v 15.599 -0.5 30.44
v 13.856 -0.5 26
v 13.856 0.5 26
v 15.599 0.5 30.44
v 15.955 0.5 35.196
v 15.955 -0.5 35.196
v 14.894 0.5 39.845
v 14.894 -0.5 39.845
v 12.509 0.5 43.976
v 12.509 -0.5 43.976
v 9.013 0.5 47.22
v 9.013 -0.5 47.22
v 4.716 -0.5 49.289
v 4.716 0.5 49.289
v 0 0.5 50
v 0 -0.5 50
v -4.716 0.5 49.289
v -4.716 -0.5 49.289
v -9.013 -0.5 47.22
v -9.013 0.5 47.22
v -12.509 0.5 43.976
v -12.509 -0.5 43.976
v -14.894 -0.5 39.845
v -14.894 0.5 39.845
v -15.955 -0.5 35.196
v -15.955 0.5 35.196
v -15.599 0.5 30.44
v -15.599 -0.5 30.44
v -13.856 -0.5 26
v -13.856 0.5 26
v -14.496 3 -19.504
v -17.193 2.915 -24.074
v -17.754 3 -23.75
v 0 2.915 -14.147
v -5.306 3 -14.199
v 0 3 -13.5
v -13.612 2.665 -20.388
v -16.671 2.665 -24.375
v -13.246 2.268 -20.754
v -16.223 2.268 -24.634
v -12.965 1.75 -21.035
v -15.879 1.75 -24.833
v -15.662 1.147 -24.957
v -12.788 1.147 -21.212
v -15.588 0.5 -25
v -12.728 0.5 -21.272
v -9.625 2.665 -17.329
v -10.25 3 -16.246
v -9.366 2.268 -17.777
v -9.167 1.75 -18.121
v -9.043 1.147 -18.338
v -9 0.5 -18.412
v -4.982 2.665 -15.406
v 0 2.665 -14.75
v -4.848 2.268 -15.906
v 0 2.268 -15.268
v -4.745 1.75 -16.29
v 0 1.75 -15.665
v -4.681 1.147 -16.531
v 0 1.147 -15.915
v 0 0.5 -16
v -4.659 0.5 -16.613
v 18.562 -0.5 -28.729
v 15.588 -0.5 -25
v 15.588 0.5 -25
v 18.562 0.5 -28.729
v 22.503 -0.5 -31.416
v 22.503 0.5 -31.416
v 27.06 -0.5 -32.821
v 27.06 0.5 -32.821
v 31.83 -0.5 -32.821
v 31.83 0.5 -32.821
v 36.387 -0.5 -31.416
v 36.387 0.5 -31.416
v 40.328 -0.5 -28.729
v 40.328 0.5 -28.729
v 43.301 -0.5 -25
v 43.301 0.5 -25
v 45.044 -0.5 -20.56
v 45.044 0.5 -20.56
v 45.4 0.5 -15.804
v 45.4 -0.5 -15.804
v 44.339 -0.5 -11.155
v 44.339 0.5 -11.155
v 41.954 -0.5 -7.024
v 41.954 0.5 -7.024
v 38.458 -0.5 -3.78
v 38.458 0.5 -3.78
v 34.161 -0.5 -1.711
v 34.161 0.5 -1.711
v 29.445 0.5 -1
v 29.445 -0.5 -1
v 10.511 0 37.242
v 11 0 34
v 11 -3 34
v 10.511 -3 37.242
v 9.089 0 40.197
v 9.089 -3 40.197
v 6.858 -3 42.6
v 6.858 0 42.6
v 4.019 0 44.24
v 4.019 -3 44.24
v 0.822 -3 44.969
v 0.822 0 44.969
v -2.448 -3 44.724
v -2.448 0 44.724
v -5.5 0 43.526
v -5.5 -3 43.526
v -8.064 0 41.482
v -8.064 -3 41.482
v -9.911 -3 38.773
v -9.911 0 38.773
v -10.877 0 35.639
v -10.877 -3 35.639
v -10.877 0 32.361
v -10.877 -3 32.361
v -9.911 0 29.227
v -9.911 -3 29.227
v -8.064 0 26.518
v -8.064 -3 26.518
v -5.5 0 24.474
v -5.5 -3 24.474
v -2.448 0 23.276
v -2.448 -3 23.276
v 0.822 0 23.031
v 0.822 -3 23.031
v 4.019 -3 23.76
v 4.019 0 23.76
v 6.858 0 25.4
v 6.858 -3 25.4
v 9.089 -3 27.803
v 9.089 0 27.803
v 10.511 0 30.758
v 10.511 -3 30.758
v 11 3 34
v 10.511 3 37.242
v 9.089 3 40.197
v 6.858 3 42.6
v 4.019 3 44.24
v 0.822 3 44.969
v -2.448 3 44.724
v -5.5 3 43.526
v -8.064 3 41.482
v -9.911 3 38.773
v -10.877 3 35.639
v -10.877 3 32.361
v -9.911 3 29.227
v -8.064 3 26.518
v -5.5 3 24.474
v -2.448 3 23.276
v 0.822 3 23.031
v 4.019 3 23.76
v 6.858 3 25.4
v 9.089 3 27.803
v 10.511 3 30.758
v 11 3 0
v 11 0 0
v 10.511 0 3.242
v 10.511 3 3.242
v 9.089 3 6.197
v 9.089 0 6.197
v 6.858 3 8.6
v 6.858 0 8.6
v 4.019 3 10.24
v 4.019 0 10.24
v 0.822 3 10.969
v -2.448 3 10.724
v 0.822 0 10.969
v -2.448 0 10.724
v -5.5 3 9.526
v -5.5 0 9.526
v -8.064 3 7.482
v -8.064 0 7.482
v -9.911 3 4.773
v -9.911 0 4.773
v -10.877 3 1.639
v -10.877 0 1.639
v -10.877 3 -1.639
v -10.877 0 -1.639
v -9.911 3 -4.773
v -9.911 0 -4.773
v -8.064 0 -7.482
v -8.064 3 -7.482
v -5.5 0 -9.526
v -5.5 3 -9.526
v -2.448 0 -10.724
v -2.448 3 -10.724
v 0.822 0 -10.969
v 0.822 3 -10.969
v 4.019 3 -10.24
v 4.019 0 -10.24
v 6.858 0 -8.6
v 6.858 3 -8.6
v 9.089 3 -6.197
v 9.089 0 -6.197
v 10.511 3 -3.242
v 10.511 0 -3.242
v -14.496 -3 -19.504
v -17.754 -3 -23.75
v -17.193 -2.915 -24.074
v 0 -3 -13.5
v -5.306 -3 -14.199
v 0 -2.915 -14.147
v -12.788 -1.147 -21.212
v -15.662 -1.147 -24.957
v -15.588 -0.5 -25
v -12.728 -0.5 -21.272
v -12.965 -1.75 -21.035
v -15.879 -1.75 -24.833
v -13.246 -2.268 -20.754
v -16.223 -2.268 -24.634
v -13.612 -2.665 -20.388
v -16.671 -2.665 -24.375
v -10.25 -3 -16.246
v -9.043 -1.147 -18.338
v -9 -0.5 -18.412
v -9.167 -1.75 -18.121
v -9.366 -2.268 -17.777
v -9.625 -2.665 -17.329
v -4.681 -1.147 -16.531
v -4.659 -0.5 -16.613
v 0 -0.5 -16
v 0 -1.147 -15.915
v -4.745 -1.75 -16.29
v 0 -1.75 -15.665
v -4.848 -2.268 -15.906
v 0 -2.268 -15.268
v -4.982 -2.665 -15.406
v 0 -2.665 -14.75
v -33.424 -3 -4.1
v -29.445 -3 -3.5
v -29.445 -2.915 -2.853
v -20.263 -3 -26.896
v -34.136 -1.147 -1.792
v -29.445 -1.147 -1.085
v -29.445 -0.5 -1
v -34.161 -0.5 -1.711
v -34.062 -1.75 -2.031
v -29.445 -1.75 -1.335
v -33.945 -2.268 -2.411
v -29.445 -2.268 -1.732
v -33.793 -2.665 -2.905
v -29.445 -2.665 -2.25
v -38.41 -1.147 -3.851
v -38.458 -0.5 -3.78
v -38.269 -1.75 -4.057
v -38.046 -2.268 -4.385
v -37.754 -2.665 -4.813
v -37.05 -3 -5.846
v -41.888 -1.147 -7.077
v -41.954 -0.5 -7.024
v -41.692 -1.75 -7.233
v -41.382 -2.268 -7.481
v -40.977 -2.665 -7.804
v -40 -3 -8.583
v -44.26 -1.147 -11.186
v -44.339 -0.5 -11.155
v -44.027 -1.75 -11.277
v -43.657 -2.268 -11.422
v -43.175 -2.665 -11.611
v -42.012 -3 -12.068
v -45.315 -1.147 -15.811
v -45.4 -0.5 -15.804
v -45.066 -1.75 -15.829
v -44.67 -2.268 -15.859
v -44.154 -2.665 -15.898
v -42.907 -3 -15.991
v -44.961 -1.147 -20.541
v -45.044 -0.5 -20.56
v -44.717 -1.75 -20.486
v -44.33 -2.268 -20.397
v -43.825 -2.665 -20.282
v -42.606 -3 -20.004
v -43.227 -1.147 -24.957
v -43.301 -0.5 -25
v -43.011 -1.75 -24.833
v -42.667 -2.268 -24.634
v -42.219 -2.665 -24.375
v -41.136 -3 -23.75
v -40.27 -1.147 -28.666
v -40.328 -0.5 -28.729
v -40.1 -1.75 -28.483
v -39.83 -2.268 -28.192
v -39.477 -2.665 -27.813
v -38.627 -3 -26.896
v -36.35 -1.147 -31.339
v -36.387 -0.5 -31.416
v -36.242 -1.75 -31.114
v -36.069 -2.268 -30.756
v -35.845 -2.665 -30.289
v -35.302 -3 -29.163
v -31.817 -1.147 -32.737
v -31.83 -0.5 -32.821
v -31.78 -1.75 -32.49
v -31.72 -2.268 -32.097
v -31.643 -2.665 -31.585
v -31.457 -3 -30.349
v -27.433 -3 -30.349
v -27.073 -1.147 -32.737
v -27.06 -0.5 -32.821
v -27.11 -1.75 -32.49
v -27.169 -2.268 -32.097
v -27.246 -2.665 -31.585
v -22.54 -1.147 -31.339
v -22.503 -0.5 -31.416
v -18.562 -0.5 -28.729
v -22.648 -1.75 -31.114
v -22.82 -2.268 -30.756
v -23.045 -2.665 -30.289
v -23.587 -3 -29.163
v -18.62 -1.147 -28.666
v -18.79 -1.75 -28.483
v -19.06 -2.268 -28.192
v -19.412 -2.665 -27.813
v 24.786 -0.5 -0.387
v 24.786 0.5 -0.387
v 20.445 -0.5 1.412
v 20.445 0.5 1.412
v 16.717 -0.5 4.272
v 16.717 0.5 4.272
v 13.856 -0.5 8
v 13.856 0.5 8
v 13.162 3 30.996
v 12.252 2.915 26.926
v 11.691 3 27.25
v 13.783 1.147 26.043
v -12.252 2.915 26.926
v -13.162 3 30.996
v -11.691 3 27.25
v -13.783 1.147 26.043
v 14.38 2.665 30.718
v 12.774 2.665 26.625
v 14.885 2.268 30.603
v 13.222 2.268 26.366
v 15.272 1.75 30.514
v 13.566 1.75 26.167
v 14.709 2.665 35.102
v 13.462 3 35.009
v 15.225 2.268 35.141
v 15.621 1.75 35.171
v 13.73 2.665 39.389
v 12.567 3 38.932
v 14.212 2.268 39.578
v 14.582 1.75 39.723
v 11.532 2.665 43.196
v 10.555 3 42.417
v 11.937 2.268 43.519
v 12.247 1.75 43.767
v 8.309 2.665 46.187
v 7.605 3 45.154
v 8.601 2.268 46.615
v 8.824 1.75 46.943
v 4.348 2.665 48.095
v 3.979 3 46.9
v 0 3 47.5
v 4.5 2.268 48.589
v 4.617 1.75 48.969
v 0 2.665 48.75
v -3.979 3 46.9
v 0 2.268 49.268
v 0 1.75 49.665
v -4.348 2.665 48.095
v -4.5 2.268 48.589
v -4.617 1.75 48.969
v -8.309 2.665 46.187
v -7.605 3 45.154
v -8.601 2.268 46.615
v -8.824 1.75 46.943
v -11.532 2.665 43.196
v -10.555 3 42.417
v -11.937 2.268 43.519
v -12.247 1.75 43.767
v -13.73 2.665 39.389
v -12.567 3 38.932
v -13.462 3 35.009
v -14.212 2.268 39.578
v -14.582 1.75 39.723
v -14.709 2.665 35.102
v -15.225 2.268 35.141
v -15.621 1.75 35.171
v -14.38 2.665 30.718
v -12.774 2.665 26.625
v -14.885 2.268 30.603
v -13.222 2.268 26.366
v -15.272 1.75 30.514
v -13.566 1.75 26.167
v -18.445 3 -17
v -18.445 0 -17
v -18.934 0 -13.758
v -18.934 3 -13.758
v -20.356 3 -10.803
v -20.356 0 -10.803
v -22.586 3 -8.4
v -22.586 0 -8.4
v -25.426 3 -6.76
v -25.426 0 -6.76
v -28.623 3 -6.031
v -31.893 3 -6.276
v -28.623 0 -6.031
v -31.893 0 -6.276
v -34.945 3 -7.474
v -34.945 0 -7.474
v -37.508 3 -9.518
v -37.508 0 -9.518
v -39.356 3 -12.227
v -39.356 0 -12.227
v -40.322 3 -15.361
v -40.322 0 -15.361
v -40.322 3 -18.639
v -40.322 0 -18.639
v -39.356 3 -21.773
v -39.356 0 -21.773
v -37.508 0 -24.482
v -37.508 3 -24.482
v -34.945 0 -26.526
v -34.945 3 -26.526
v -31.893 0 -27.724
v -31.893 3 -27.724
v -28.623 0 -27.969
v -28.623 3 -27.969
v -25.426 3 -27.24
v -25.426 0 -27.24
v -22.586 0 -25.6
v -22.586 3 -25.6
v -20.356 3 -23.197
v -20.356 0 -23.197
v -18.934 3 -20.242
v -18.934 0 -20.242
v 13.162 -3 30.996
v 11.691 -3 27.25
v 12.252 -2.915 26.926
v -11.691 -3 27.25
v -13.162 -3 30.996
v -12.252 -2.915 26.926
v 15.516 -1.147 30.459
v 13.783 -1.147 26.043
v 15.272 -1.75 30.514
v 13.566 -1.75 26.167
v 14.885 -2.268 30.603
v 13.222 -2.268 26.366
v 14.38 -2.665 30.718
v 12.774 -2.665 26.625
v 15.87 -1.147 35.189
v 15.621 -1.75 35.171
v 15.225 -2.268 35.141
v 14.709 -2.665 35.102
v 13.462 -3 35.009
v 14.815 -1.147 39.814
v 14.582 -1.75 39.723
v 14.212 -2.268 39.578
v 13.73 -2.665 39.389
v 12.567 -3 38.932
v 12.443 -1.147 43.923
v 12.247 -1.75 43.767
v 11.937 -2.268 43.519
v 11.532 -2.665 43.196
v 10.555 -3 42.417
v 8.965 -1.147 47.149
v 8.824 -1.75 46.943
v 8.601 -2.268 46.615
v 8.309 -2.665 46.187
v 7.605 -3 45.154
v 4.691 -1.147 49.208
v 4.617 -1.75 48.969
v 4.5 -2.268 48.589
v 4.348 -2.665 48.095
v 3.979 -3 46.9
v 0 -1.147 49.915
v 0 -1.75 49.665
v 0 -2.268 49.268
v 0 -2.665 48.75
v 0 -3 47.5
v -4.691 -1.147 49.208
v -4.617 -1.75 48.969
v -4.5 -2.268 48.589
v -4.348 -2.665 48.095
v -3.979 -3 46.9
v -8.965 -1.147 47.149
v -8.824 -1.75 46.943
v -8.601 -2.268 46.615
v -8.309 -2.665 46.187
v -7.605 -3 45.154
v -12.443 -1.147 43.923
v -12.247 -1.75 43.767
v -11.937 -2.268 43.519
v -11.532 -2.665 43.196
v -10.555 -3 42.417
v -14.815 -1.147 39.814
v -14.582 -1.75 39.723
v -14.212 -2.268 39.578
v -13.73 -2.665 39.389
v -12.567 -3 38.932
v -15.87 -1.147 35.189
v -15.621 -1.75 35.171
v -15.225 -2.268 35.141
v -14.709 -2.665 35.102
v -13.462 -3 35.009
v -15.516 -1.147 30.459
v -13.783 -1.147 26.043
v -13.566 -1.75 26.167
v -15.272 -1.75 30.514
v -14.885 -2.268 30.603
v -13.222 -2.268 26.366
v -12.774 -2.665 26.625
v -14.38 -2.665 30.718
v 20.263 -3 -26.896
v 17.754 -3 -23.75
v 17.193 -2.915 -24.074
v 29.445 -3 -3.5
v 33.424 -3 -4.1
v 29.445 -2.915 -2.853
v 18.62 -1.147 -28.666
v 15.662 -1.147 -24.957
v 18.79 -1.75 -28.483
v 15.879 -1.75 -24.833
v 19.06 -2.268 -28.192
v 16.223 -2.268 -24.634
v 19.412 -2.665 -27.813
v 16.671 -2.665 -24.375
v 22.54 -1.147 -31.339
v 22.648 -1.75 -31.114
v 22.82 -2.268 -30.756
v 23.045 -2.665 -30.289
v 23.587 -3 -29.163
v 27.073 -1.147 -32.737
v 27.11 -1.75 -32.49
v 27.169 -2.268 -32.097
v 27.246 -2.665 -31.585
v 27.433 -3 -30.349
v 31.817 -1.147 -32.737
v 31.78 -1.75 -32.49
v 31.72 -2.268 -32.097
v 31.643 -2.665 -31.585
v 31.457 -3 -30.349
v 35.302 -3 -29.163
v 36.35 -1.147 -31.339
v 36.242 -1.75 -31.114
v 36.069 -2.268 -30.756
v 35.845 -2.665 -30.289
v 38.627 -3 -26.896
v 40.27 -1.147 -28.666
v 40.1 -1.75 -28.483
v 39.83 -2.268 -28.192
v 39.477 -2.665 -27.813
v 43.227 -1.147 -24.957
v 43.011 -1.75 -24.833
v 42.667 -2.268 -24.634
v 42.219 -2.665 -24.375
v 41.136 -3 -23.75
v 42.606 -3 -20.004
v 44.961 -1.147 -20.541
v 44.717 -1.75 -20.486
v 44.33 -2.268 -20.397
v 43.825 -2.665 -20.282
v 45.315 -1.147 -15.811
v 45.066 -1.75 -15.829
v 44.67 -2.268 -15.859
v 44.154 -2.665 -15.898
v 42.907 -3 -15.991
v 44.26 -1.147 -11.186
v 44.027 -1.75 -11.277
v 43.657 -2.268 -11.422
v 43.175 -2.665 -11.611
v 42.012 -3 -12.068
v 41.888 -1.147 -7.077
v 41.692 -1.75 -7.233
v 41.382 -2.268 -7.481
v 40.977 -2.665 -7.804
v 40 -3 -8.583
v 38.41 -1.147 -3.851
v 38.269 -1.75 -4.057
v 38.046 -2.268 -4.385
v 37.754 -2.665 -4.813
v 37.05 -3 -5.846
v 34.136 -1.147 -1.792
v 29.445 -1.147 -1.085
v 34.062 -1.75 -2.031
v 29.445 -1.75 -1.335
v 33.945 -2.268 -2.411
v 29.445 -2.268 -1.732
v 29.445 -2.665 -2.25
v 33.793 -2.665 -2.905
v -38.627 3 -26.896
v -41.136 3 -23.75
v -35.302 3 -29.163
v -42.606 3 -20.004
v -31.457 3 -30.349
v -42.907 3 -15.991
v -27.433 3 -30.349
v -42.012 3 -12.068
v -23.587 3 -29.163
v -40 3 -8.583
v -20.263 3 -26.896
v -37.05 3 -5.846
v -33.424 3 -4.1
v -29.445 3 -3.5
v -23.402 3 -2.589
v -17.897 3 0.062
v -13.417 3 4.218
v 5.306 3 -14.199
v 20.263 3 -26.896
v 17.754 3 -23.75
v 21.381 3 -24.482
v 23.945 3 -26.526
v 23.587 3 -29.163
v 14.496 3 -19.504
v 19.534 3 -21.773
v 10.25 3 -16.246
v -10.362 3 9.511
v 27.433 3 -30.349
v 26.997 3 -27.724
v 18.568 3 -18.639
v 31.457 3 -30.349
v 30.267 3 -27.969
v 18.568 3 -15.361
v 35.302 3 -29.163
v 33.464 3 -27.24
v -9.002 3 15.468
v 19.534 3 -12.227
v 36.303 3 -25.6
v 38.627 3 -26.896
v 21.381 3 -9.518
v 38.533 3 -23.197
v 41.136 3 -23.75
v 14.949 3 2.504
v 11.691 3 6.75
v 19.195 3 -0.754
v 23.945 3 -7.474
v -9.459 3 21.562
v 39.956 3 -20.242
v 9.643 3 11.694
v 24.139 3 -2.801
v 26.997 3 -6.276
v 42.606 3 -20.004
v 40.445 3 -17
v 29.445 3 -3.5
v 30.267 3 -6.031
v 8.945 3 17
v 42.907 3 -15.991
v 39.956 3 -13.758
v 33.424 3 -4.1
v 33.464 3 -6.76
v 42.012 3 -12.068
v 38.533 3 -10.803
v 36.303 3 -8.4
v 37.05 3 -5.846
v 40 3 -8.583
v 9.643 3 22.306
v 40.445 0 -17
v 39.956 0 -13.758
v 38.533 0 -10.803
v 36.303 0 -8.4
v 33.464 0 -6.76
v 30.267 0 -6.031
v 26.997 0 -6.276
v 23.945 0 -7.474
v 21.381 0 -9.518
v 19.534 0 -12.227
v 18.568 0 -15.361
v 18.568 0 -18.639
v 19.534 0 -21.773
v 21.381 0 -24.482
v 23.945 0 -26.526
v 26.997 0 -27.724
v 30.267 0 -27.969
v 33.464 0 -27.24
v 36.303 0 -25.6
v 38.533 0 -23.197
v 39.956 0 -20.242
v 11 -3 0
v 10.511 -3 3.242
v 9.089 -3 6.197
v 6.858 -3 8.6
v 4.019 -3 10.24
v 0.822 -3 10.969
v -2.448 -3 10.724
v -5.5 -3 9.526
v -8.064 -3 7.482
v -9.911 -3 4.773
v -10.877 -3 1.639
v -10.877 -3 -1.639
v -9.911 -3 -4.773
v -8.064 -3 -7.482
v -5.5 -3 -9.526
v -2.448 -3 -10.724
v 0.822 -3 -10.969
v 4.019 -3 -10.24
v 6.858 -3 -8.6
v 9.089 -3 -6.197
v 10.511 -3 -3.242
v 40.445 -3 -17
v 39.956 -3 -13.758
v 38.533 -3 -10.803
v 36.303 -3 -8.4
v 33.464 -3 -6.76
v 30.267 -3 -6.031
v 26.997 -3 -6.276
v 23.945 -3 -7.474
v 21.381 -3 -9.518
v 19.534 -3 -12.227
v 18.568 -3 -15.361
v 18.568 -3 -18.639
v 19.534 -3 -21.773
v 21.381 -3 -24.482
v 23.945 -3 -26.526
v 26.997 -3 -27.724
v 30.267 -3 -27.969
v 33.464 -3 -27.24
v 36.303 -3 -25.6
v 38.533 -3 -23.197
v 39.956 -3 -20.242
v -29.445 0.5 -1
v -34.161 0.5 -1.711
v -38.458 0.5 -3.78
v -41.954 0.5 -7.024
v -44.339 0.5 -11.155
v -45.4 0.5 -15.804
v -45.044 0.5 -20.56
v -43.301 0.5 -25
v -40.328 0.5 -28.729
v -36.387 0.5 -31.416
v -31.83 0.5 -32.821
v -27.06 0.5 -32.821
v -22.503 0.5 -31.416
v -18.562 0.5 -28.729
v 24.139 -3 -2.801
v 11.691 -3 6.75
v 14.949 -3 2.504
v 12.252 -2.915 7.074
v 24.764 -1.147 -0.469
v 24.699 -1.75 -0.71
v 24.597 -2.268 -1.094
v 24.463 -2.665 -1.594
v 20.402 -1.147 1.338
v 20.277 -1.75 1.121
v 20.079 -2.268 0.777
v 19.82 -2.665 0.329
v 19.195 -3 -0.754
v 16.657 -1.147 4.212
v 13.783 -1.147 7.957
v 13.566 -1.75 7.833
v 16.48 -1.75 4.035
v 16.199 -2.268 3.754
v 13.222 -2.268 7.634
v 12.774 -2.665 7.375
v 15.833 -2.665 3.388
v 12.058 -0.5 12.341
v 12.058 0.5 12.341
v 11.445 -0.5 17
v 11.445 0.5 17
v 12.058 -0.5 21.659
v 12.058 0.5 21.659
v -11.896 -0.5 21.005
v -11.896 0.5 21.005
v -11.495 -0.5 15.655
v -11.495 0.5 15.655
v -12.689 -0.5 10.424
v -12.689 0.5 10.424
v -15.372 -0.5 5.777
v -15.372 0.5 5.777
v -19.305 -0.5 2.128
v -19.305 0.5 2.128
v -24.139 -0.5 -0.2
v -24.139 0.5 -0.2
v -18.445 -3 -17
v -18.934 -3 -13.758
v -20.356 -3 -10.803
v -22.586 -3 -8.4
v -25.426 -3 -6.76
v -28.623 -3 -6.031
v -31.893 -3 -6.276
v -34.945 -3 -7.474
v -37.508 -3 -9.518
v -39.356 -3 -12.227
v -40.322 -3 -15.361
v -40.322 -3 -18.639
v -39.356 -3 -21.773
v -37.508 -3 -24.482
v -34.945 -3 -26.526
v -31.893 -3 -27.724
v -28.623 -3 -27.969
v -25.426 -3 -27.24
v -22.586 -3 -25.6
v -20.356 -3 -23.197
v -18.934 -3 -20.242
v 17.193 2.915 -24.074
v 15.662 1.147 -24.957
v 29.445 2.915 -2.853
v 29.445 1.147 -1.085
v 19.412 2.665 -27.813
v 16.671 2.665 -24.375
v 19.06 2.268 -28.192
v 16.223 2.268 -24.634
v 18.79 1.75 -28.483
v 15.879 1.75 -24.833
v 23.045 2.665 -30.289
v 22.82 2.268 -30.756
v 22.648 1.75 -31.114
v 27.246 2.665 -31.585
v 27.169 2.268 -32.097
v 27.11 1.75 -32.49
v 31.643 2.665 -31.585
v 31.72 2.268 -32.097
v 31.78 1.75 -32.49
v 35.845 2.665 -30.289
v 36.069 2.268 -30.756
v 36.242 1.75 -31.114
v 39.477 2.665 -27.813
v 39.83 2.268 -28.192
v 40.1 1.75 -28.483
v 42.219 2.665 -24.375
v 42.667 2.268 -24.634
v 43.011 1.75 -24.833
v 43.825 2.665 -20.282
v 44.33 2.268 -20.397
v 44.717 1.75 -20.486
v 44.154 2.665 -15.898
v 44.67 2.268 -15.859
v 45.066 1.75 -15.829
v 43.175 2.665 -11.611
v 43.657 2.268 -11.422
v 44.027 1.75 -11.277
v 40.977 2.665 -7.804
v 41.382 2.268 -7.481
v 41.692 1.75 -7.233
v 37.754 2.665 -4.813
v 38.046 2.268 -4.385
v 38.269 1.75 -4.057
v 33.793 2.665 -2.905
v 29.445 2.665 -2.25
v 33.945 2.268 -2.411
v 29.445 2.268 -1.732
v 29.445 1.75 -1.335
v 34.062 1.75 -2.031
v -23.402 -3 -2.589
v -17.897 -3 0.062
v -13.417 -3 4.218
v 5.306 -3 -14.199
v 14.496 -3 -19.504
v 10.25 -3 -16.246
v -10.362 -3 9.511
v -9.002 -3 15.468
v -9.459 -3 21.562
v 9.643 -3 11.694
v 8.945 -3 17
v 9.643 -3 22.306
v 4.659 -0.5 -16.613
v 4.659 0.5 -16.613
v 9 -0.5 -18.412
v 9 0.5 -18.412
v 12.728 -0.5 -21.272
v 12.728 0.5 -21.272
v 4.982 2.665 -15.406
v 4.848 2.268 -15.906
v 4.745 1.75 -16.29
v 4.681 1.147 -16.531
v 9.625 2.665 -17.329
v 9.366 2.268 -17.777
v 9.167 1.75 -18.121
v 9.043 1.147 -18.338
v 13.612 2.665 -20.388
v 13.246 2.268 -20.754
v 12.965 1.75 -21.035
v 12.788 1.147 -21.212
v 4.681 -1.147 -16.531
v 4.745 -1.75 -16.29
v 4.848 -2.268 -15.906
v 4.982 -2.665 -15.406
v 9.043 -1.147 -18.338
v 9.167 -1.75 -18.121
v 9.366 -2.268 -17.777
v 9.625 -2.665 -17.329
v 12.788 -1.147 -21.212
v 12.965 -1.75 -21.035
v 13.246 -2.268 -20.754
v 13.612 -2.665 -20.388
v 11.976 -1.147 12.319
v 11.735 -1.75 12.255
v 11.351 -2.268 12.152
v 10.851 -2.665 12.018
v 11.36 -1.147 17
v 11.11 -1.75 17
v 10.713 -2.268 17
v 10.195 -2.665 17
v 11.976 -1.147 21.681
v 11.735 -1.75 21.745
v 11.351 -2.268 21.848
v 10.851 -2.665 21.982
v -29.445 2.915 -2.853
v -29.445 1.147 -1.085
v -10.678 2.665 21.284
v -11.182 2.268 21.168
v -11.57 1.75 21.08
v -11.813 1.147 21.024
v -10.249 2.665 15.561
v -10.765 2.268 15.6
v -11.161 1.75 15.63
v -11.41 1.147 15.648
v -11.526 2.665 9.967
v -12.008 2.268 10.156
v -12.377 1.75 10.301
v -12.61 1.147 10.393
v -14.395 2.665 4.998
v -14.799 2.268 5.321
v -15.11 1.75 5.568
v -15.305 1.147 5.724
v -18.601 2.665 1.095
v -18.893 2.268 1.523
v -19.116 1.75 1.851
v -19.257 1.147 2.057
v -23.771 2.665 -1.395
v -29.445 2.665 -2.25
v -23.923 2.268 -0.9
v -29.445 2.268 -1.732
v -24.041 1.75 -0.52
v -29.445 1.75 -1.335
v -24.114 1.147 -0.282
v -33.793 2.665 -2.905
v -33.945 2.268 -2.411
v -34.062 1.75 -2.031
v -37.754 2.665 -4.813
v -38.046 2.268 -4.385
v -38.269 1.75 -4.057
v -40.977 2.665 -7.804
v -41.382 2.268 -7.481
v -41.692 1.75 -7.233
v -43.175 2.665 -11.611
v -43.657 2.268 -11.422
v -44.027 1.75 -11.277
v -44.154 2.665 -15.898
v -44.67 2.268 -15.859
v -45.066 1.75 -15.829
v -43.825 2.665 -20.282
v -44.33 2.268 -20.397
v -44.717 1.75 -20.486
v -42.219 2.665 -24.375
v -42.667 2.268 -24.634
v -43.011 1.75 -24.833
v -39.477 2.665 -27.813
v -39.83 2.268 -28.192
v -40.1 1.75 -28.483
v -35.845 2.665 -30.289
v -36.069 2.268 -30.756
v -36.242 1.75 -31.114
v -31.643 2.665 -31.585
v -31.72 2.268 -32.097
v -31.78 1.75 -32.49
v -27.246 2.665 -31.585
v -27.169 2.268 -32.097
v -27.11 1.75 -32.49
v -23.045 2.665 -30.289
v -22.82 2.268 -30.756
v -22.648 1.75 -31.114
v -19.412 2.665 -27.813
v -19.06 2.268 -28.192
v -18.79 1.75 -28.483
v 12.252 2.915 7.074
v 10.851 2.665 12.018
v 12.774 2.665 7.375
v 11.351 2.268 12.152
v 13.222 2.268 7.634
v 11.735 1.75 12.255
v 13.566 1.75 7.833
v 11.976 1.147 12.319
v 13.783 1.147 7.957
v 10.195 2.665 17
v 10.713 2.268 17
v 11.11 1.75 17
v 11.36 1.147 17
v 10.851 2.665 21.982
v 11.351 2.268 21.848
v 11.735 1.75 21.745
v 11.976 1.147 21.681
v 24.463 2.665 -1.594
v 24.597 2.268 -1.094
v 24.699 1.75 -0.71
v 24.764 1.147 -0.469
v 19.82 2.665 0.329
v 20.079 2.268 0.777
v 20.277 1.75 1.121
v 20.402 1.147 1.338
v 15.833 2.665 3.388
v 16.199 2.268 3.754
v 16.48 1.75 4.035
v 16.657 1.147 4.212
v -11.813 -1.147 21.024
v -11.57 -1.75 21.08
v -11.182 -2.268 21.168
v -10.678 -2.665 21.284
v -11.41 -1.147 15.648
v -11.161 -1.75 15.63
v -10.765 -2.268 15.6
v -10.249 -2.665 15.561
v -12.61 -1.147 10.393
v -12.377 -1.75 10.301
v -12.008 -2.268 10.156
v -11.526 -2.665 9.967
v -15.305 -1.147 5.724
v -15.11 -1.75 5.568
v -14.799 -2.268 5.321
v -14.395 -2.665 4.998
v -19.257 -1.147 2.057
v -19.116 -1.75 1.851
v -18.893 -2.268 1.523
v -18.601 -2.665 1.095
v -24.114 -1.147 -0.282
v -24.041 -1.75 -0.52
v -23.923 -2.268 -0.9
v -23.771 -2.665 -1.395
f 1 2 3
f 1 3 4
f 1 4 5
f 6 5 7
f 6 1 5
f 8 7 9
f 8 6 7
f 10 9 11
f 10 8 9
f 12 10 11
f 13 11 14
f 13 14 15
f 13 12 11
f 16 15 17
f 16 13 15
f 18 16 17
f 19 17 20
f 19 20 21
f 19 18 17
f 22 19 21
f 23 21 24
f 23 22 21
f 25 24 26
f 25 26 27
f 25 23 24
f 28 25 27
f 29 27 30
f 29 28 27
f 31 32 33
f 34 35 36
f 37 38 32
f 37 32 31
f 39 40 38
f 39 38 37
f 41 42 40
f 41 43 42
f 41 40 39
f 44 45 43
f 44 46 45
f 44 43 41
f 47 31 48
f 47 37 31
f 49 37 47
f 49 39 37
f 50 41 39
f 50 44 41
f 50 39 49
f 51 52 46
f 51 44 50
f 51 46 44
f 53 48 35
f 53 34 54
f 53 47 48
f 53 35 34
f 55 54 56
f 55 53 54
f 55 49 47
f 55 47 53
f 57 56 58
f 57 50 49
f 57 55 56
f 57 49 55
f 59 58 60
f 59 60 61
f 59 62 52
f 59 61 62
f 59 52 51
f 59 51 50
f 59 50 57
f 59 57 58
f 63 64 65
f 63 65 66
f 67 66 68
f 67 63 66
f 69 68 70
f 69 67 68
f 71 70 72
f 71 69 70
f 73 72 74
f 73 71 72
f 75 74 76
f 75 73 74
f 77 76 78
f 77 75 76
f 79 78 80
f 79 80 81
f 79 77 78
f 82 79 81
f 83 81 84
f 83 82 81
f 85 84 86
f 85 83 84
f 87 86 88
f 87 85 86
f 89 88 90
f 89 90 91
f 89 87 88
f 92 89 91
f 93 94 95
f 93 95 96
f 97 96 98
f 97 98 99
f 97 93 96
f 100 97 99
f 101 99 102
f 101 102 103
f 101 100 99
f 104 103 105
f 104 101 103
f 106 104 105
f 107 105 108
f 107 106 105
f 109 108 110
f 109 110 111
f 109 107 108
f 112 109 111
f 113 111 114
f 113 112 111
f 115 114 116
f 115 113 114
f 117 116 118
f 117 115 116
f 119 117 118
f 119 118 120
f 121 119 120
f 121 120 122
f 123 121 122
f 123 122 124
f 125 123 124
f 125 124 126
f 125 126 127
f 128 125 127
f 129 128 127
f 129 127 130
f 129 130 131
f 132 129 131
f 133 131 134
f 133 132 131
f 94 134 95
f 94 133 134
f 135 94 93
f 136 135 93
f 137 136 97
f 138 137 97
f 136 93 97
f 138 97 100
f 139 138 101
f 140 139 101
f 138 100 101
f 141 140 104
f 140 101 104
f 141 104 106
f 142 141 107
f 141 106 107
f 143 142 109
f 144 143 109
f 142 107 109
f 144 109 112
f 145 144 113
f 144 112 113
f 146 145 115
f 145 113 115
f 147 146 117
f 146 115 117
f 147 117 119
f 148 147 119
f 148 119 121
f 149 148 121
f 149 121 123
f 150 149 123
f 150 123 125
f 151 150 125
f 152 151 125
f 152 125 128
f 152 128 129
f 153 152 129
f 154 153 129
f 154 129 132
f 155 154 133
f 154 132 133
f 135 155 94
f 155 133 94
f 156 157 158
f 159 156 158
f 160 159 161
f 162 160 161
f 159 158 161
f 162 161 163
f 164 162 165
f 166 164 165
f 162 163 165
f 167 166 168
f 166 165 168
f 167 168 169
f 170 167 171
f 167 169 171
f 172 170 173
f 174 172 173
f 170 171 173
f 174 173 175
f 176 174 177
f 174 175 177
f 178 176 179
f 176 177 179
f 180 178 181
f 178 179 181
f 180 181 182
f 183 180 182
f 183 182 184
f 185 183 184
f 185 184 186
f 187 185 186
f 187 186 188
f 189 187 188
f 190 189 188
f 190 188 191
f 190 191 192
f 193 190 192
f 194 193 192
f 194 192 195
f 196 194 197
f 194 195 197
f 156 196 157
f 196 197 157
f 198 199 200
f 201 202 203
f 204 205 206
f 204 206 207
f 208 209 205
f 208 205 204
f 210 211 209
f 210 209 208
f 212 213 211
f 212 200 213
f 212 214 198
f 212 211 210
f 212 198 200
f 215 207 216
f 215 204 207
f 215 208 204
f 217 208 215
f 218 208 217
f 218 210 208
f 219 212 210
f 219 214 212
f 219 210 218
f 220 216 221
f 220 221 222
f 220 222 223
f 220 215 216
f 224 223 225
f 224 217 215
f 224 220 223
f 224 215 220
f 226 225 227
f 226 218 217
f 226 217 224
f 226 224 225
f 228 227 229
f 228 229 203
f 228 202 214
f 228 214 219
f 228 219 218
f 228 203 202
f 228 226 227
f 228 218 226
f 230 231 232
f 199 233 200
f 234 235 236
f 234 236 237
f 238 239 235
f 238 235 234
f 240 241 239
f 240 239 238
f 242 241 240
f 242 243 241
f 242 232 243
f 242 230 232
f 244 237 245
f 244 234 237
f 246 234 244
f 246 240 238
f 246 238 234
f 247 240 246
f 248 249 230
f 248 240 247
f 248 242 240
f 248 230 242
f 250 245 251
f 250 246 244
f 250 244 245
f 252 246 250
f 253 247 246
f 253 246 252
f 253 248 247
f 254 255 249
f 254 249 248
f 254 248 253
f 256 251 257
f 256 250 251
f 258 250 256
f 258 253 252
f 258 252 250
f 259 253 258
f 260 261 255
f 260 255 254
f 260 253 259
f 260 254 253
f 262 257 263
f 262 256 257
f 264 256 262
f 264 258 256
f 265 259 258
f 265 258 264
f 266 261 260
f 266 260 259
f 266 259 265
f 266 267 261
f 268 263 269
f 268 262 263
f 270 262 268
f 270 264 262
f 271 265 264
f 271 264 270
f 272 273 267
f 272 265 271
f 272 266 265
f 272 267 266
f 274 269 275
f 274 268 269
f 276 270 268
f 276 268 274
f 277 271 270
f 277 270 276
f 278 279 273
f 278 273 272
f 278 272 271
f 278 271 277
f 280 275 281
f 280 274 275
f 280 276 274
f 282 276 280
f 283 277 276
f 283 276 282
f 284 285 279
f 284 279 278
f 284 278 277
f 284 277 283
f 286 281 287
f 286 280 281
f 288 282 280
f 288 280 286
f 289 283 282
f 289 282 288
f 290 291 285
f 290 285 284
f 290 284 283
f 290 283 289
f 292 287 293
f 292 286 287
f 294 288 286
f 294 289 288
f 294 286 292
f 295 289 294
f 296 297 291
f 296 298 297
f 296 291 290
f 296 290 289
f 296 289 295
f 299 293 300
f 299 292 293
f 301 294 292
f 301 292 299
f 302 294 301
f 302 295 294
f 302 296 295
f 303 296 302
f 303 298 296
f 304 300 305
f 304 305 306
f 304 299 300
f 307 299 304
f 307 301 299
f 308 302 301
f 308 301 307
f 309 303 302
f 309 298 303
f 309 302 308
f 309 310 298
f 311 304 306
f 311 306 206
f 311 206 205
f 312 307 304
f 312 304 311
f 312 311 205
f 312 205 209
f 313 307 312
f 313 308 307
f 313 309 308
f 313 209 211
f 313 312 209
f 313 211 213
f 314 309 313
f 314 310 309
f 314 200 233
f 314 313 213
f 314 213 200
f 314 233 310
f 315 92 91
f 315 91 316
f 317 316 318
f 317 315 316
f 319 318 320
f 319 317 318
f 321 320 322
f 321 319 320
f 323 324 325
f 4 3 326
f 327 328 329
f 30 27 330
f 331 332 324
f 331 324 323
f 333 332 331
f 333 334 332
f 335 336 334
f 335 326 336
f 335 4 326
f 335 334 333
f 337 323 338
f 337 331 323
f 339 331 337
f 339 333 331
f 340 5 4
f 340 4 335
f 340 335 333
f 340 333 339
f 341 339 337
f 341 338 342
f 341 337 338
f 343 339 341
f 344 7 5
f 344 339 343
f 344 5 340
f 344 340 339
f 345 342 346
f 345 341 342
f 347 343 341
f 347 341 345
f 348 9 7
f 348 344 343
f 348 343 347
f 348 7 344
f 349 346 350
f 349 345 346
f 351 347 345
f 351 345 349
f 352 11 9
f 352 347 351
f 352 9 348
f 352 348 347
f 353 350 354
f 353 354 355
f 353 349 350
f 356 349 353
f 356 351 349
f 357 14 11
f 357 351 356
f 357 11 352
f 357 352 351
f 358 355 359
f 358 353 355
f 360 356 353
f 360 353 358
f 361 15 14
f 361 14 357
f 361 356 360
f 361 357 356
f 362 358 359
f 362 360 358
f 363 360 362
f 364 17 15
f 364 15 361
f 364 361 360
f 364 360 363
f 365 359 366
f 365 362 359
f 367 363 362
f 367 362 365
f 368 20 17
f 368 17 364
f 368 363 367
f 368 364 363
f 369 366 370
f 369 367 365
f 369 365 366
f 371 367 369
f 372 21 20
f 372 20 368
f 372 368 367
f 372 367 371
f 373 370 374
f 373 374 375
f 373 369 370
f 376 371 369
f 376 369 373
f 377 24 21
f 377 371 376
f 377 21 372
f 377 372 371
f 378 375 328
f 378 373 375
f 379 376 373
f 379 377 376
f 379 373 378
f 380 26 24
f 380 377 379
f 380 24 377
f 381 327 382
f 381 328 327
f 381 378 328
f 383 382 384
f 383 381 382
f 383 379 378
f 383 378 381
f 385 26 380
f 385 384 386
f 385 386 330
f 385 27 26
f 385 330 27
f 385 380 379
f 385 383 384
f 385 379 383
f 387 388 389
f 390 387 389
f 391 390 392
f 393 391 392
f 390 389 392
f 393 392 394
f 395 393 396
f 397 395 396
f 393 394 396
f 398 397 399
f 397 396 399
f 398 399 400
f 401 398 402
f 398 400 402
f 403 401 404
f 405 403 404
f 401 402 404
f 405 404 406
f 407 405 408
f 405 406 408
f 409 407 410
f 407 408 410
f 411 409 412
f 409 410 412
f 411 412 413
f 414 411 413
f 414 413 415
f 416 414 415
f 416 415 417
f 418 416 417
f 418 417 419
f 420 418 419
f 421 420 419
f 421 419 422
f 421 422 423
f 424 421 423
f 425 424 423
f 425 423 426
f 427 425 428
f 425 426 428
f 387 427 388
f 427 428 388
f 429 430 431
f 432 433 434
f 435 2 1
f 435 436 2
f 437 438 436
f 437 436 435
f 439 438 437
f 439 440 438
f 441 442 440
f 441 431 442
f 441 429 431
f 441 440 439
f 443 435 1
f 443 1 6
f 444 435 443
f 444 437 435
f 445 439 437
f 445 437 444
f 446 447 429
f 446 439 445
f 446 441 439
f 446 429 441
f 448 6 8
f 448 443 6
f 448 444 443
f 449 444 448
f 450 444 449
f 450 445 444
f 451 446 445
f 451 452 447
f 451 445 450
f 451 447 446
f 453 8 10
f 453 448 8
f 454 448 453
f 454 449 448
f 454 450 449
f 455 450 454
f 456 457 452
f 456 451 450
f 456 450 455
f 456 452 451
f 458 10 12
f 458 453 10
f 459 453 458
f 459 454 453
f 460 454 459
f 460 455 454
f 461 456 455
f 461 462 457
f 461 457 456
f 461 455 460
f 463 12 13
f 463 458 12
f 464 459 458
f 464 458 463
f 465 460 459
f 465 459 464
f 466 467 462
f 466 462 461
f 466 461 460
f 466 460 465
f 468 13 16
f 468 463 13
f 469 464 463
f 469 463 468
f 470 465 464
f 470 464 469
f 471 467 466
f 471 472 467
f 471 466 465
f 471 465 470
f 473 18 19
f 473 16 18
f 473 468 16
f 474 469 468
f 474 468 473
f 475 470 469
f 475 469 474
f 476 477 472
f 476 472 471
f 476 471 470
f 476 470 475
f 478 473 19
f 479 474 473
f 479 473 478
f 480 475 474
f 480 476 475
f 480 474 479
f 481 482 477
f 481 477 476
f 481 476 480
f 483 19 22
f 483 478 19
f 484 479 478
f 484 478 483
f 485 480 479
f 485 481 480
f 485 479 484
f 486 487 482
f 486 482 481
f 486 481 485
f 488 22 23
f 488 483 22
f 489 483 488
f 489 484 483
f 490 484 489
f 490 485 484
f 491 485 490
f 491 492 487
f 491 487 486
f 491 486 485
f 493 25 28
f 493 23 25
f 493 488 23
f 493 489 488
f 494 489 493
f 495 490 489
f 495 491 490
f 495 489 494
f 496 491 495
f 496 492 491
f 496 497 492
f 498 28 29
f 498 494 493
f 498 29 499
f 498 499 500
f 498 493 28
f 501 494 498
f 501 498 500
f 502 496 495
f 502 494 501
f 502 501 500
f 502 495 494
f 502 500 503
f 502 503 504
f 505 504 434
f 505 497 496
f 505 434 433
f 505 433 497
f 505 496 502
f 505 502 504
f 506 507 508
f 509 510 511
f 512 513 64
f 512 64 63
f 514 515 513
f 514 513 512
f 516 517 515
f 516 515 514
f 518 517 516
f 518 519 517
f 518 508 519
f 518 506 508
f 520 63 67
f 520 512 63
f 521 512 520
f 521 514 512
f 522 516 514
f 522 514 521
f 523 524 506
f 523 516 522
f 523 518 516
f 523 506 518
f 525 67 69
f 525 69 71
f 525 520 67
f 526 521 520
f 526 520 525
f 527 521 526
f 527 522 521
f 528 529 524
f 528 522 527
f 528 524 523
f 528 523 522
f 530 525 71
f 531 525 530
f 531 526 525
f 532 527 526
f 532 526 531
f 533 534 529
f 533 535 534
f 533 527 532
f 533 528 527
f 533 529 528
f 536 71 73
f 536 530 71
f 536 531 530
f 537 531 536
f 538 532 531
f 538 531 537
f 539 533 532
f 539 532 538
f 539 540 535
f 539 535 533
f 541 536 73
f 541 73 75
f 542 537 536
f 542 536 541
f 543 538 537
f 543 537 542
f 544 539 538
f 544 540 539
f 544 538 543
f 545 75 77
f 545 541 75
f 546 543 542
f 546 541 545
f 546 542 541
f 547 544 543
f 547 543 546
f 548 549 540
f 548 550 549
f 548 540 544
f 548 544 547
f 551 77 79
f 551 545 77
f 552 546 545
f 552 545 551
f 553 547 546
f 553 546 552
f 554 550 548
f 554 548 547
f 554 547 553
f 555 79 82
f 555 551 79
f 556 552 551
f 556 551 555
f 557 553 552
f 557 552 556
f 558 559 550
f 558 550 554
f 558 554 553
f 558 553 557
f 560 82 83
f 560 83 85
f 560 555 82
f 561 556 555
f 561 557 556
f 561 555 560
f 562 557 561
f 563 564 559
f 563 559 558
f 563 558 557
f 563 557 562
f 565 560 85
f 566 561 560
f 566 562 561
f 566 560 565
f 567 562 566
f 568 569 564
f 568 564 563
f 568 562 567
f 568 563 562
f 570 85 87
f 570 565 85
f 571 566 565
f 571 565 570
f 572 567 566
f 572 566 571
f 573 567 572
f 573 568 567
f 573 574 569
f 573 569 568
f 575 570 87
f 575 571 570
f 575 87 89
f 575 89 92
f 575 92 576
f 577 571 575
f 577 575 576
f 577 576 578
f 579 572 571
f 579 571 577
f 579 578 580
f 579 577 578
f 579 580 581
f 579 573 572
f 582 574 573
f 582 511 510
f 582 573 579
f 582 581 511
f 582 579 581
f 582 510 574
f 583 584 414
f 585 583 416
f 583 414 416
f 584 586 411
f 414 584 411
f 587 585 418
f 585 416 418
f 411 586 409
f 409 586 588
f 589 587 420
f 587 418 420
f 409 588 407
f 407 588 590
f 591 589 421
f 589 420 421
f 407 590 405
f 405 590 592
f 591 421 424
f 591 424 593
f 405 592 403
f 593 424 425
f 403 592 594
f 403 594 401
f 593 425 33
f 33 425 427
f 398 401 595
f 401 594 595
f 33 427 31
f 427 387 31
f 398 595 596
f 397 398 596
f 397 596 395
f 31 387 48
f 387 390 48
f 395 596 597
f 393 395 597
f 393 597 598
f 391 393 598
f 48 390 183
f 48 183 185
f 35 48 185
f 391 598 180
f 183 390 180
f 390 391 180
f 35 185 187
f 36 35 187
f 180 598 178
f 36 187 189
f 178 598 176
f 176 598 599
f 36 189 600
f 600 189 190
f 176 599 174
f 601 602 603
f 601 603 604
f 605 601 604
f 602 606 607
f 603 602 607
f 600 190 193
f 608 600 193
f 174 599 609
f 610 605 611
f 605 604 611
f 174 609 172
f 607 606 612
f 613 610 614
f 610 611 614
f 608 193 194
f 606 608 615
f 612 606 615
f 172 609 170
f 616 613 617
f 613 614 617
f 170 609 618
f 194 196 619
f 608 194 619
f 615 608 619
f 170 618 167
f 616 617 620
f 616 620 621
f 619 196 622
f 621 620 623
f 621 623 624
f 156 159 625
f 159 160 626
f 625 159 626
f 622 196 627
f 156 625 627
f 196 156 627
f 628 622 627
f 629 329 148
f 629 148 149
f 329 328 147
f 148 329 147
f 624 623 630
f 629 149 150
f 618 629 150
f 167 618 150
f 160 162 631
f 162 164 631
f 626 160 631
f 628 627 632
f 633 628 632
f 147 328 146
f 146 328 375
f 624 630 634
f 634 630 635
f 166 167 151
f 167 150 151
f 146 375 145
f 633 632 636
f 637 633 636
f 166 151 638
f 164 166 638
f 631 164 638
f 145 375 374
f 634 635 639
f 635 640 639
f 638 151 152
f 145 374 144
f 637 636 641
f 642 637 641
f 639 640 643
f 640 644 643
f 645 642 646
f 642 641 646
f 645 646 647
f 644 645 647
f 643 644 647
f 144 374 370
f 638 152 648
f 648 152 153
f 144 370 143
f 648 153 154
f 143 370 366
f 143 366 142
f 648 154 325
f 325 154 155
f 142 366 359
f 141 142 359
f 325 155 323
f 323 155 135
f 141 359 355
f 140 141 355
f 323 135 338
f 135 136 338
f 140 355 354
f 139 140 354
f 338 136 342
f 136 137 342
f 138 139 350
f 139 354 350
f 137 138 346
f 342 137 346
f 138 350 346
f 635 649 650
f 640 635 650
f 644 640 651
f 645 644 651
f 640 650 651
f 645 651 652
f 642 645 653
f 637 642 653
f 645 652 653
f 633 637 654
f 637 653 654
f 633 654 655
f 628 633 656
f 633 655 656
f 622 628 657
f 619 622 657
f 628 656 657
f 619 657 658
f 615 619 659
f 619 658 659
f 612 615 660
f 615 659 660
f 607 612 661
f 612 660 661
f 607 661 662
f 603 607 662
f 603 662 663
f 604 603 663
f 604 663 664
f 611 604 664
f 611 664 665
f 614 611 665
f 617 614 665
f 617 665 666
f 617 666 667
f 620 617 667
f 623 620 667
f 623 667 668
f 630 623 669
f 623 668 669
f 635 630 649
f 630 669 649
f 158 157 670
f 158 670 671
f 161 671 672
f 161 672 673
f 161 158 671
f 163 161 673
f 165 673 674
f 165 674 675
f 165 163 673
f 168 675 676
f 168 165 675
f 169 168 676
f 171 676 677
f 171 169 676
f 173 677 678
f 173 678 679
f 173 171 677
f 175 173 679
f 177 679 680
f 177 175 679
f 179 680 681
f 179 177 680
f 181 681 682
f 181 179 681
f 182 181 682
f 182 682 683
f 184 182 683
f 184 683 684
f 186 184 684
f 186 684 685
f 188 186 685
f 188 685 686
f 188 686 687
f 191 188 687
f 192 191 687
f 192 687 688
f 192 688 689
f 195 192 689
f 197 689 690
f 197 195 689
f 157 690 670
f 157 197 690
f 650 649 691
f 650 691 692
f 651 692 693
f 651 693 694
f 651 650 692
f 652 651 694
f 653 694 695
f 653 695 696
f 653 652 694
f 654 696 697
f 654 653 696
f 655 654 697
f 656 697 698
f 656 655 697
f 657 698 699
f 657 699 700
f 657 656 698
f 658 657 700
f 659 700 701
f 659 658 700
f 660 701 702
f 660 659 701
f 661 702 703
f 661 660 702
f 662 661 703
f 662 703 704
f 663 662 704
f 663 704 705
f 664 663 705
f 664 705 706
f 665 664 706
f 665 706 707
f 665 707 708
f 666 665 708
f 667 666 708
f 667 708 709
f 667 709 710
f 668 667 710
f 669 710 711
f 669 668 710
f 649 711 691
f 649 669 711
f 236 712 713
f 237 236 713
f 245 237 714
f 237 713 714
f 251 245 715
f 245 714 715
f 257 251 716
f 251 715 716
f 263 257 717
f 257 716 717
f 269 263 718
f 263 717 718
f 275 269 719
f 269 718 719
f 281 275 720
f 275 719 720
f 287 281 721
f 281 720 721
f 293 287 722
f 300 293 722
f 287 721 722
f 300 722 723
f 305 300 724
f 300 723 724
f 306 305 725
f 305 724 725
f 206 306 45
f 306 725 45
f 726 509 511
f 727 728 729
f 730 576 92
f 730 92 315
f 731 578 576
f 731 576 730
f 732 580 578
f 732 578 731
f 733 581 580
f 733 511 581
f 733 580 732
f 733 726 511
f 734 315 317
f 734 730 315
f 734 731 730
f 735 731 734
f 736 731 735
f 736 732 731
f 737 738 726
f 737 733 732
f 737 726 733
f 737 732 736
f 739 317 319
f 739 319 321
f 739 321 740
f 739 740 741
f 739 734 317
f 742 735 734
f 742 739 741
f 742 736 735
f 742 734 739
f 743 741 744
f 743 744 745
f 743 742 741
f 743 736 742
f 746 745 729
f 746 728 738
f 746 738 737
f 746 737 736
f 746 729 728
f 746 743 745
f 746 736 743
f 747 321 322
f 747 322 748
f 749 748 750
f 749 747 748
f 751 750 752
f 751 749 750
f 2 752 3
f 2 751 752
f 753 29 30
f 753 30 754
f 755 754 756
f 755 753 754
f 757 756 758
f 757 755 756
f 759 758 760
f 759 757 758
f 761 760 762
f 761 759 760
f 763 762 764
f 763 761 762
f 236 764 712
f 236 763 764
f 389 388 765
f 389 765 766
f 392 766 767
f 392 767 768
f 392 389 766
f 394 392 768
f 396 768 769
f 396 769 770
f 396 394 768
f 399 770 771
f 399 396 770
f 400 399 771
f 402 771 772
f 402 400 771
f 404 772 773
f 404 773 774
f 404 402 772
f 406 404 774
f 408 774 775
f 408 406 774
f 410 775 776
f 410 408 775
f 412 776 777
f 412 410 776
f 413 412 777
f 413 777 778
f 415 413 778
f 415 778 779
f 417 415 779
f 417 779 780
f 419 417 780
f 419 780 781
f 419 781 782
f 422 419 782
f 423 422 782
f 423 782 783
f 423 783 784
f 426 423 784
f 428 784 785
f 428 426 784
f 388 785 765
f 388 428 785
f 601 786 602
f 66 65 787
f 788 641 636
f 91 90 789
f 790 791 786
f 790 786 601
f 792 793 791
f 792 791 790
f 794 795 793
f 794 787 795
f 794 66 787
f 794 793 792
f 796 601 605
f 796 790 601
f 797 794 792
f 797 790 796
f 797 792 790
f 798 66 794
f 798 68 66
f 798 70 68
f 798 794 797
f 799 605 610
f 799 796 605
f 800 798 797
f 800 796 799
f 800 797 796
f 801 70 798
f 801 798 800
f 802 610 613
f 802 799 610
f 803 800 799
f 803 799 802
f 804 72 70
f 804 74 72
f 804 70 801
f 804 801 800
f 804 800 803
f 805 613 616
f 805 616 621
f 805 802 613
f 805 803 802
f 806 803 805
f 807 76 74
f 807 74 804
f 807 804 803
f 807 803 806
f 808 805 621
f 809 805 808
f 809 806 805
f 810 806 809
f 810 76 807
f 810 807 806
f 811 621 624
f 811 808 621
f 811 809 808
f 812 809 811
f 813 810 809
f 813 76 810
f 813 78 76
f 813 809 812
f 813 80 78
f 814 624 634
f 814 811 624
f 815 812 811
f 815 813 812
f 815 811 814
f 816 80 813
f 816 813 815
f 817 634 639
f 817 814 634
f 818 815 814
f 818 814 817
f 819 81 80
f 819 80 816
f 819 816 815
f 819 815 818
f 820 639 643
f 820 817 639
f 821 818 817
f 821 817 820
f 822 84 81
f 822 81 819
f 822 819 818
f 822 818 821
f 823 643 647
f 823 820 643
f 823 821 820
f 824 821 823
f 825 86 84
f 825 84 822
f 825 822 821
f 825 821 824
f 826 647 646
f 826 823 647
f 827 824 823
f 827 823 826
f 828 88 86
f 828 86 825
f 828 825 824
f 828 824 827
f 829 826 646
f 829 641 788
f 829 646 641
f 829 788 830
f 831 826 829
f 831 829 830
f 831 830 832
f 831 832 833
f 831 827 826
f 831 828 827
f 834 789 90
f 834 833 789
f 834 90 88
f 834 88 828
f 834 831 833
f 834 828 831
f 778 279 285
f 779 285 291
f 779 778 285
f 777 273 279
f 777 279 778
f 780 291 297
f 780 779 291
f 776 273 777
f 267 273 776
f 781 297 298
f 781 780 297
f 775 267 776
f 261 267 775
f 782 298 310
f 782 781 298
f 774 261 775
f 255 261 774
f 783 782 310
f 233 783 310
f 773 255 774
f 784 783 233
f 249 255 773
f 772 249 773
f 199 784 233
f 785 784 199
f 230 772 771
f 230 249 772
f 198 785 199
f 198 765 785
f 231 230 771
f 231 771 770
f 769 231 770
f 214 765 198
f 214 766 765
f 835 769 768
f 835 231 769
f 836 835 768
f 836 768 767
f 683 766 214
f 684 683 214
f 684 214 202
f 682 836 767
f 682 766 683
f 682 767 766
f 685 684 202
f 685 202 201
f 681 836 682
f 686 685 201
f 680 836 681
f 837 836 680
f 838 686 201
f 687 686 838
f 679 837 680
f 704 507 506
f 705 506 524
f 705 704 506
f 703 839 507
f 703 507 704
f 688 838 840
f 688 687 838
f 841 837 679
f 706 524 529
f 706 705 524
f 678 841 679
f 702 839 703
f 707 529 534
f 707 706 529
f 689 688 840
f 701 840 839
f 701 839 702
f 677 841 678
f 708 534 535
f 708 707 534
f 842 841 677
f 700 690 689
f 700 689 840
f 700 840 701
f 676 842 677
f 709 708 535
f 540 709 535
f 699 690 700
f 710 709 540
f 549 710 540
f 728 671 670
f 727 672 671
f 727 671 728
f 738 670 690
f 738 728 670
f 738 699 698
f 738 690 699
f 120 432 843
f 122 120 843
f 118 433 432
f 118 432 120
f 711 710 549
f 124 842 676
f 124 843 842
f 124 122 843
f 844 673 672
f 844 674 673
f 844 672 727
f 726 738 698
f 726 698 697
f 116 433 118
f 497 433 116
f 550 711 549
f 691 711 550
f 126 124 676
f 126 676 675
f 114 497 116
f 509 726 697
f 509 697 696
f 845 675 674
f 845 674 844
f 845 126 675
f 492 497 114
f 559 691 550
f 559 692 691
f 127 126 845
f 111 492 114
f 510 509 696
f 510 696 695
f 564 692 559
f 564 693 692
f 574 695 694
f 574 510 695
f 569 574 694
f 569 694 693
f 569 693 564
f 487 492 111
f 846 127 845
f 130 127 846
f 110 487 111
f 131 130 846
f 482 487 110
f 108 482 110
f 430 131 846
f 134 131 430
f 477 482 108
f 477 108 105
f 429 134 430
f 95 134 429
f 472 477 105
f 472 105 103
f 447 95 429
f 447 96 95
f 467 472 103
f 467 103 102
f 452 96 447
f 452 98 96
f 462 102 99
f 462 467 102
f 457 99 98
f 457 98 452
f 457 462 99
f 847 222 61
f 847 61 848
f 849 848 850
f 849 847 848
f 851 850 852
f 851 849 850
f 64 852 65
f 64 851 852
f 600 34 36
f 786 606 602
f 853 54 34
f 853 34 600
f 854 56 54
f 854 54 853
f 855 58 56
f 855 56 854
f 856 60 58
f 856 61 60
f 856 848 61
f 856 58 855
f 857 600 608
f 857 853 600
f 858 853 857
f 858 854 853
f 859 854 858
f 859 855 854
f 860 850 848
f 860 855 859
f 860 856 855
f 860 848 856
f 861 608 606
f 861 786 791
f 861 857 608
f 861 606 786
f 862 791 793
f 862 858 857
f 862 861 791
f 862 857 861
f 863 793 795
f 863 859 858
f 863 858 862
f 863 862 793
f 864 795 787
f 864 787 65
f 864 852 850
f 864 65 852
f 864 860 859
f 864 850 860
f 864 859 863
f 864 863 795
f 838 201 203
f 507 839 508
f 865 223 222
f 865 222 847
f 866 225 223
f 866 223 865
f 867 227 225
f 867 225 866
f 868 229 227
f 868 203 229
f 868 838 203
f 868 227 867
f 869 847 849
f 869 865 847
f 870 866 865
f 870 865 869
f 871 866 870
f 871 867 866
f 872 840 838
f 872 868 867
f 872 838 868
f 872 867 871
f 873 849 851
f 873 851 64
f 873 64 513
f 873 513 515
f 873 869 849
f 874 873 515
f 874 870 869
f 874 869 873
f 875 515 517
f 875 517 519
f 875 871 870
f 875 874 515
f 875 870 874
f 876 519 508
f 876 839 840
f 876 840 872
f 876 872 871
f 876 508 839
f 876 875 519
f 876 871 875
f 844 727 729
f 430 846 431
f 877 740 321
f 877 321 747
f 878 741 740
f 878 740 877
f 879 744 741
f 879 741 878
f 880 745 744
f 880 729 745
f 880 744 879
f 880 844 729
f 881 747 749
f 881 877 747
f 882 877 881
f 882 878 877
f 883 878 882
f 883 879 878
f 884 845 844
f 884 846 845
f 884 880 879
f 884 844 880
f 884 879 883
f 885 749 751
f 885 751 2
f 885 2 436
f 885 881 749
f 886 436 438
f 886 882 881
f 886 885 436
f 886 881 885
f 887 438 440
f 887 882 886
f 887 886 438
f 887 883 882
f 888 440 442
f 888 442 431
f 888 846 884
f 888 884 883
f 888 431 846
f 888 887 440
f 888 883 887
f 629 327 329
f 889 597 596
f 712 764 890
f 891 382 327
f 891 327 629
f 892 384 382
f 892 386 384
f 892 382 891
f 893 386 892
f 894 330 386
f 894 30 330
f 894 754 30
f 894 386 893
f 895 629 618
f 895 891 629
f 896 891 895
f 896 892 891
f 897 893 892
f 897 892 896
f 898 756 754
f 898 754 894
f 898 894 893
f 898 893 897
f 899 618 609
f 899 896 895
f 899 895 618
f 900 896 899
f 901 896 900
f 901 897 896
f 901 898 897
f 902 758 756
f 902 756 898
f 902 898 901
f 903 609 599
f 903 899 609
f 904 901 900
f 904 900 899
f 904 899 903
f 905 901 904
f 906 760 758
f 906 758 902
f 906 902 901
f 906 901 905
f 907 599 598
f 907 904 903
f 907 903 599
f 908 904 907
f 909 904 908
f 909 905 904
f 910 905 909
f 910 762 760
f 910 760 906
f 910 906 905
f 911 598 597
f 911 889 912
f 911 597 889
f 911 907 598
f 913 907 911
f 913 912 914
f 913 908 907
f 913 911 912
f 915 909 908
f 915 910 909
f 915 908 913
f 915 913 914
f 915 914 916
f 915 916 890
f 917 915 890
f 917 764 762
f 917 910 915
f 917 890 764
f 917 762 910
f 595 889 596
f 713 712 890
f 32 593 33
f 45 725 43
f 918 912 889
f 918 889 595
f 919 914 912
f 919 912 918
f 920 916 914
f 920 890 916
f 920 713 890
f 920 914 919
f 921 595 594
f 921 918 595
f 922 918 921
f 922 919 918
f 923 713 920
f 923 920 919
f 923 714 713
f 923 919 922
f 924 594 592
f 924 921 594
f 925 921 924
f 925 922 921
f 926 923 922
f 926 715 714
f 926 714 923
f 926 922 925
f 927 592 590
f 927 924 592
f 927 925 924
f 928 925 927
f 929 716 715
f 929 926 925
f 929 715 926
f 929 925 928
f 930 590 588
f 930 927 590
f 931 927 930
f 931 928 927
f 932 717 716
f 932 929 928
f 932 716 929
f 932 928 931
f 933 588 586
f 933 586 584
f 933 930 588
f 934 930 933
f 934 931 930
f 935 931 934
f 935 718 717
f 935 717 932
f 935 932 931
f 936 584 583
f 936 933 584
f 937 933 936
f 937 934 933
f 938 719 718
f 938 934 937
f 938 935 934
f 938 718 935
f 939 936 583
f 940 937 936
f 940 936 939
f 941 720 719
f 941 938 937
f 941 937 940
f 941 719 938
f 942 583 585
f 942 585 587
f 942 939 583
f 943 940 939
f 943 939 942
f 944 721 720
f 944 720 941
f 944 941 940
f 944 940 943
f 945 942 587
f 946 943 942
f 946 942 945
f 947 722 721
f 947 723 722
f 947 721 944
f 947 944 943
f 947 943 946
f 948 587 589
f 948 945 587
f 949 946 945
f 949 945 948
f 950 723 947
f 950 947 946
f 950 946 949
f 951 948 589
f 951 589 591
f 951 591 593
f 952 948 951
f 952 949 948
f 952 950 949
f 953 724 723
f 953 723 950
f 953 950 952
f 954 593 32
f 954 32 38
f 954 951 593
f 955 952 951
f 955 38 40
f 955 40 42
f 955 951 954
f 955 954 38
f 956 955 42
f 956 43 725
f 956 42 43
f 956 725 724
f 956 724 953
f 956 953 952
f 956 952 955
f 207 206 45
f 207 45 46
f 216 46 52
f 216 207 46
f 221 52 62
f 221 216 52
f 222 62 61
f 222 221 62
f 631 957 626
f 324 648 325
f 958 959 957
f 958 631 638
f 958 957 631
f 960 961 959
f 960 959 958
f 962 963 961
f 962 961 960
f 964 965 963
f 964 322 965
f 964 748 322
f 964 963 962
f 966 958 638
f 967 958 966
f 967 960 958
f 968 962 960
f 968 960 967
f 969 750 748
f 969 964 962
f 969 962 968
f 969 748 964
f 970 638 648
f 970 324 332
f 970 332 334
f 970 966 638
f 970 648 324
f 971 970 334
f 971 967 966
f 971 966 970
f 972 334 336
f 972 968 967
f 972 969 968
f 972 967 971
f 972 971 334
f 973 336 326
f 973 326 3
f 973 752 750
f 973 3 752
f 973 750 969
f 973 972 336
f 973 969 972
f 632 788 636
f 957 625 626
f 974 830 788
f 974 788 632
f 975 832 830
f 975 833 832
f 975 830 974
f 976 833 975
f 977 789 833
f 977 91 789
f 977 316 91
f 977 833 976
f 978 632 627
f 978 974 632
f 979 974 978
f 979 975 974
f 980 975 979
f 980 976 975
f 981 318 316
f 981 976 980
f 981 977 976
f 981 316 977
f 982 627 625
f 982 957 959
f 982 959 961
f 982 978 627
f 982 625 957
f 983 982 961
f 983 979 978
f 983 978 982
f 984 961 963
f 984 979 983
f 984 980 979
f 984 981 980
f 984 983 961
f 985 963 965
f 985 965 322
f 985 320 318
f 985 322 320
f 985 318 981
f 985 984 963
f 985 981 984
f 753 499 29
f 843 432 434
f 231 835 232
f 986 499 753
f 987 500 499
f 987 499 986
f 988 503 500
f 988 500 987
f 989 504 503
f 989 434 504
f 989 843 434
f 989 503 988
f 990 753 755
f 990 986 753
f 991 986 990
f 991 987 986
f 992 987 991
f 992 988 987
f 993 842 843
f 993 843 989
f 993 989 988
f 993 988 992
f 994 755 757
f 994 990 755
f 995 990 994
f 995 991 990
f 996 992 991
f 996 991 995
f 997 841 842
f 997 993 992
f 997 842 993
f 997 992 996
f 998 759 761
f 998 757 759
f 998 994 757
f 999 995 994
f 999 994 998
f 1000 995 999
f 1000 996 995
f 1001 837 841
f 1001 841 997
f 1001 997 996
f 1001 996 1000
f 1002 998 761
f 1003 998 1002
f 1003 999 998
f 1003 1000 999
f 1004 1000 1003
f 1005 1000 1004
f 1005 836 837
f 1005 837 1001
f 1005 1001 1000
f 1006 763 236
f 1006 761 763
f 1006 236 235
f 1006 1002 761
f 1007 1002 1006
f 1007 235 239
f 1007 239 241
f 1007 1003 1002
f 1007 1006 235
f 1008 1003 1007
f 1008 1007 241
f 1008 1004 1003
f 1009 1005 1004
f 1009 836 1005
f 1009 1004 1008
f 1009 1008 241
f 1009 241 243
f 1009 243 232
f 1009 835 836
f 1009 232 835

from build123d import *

# Parameters (mm, degrees)
F0_R     = 11
F1_DEPTH = 3
F2_R     = 2.5
F3_R     = 2.5


with BuildPart() as f1:
    # F0 (on Front) → F1 (new body, symmetric)
    with BuildSketch(Plane.XZ):
        with BuildLine():
            ThreePointArc((13.8564064606, 26), (15.4548132206, 29.8588952784), (16, 34))
            ThreePointArc((16, 34), (-4.1411047216, 49.4548132206), (-13.8564064606, 26))
            ThreePointArc((-13.8564064606, 26), (0, 18), (13.8564064606, 26))
        make_face()
        with Locations((0, 34)):
            Circle(F0_R, mode=Mode.SUBTRACT)
        with BuildLine():
            ThreePointArc((13.8564064606, 26), (0, 18), (-13.8564064606, 26))
            ThreePointArc((-13.8564064606, 26), (-11.4448637287, 17), (-13.8564064606, 8))
            ThreePointArc((-13.8564064606, 8), (0, 16), (13.8564064606, 8))
            ThreePointArc((13.8564064606, 8), (11.4448637287, 17), (13.8564064606, 26))
        make_face()
        with BuildLine():
            ThreePointArc((13.8564064606, 8), (0, 16), (-13.8564064606, 8))
            ThreePointArc((-13.8564064606, 8), (-13.8564064606, -8), (0, -16))
            ThreePointArc((0, -16), (11.313708499, -11.313708499), (16, 0))
            ThreePointArc((16, 0), (15.4548132206, 4.1411047216), (13.8564064606, 8))
        make_face()
        Circle(F0_R, mode=Mode.SUBTRACT)
        with BuildLine():
            ThreePointArc((0, -16), (-13.8564064606, -8), (-13.8564064606, 8))
            ThreePointArc((-13.8564064606, 8), (-20.4448637287, 1.4115427319), (-29.4448637287, -1))
            ThreePointArc((-29.4448637287, -1), (-18.1311552297, -5.686291501), (-13.4448637287, -17))
            ThreePointArc((-13.4448637287, -17), (-13.990050508, -21.1411047216), (-15.5884572681, -25))
            ThreePointArc((-15.5884572681, -25), (-9, -18.4115427319), (0, -16))
        make_face()
        with BuildLine():
            ThreePointArc((29.4448637287, -1), (20.4448637287, 1.4115427319), (13.8564064606, 8))
            ThreePointArc((13.8564064606, 8), (15.4548132206, 4.1411047216), (16, 0))
            ThreePointArc((16, 0), (11.313708499, -11.313708499), (0, -16))
            ThreePointArc((0, -16), (9, -18.4115427319), (15.5884572681, -25))
            ThreePointArc((15.5884572681, -25), (15.5884572681, -9), (29.4448637287, -1))
        make_face()
        with BuildLine():
            ThreePointArc((-13.4448637287, -17), (-18.1311552297, -5.686291501), (-29.4448637287, -1))
            ThreePointArc((-29.4448637287, -1), (-43.3012701892, -25), (-15.5884572681, -25))
            ThreePointArc((-15.5884572681, -25), (-13.990050508, -21.1411047216), (-13.4448637287, -17))
        make_face()
        with Locations((-29.4448637287, -17)):
            Circle(F0_R, mode=Mode.SUBTRACT)
        with BuildLine():
            ThreePointArc((45.4448637287, -17), (40.7585722277, -5.686291501), (29.4448637287, -1))
            ThreePointArc((29.4448637287, -1), (15.5884572681, -9), (15.5884572681, -25))
            ThreePointArc((15.5884572681, -25), (33.5859684503, -32.4548132206), (45.4448637287, -17))
        make_face()
        with Locations((29.4448637287, -17)):
            Circle(F0_R, mode=Mode.SUBTRACT)
    extrude(amount=F1_DEPTH, both=True)

    # F2
    f2_edges = [f1.edges().sort_by_distance(p)[0] for p in [
        (0, -3, 50),
    ]]
    fillet(f2_edges, radius=F2_R)

    # F3
    f3_edges = [f1.edges().sort_by_distance(p)[0] for p in [
        (13.856406, 3, 8),
    ]]
    fillet(f3_edges, radius=F3_R)


solid = f1.part
